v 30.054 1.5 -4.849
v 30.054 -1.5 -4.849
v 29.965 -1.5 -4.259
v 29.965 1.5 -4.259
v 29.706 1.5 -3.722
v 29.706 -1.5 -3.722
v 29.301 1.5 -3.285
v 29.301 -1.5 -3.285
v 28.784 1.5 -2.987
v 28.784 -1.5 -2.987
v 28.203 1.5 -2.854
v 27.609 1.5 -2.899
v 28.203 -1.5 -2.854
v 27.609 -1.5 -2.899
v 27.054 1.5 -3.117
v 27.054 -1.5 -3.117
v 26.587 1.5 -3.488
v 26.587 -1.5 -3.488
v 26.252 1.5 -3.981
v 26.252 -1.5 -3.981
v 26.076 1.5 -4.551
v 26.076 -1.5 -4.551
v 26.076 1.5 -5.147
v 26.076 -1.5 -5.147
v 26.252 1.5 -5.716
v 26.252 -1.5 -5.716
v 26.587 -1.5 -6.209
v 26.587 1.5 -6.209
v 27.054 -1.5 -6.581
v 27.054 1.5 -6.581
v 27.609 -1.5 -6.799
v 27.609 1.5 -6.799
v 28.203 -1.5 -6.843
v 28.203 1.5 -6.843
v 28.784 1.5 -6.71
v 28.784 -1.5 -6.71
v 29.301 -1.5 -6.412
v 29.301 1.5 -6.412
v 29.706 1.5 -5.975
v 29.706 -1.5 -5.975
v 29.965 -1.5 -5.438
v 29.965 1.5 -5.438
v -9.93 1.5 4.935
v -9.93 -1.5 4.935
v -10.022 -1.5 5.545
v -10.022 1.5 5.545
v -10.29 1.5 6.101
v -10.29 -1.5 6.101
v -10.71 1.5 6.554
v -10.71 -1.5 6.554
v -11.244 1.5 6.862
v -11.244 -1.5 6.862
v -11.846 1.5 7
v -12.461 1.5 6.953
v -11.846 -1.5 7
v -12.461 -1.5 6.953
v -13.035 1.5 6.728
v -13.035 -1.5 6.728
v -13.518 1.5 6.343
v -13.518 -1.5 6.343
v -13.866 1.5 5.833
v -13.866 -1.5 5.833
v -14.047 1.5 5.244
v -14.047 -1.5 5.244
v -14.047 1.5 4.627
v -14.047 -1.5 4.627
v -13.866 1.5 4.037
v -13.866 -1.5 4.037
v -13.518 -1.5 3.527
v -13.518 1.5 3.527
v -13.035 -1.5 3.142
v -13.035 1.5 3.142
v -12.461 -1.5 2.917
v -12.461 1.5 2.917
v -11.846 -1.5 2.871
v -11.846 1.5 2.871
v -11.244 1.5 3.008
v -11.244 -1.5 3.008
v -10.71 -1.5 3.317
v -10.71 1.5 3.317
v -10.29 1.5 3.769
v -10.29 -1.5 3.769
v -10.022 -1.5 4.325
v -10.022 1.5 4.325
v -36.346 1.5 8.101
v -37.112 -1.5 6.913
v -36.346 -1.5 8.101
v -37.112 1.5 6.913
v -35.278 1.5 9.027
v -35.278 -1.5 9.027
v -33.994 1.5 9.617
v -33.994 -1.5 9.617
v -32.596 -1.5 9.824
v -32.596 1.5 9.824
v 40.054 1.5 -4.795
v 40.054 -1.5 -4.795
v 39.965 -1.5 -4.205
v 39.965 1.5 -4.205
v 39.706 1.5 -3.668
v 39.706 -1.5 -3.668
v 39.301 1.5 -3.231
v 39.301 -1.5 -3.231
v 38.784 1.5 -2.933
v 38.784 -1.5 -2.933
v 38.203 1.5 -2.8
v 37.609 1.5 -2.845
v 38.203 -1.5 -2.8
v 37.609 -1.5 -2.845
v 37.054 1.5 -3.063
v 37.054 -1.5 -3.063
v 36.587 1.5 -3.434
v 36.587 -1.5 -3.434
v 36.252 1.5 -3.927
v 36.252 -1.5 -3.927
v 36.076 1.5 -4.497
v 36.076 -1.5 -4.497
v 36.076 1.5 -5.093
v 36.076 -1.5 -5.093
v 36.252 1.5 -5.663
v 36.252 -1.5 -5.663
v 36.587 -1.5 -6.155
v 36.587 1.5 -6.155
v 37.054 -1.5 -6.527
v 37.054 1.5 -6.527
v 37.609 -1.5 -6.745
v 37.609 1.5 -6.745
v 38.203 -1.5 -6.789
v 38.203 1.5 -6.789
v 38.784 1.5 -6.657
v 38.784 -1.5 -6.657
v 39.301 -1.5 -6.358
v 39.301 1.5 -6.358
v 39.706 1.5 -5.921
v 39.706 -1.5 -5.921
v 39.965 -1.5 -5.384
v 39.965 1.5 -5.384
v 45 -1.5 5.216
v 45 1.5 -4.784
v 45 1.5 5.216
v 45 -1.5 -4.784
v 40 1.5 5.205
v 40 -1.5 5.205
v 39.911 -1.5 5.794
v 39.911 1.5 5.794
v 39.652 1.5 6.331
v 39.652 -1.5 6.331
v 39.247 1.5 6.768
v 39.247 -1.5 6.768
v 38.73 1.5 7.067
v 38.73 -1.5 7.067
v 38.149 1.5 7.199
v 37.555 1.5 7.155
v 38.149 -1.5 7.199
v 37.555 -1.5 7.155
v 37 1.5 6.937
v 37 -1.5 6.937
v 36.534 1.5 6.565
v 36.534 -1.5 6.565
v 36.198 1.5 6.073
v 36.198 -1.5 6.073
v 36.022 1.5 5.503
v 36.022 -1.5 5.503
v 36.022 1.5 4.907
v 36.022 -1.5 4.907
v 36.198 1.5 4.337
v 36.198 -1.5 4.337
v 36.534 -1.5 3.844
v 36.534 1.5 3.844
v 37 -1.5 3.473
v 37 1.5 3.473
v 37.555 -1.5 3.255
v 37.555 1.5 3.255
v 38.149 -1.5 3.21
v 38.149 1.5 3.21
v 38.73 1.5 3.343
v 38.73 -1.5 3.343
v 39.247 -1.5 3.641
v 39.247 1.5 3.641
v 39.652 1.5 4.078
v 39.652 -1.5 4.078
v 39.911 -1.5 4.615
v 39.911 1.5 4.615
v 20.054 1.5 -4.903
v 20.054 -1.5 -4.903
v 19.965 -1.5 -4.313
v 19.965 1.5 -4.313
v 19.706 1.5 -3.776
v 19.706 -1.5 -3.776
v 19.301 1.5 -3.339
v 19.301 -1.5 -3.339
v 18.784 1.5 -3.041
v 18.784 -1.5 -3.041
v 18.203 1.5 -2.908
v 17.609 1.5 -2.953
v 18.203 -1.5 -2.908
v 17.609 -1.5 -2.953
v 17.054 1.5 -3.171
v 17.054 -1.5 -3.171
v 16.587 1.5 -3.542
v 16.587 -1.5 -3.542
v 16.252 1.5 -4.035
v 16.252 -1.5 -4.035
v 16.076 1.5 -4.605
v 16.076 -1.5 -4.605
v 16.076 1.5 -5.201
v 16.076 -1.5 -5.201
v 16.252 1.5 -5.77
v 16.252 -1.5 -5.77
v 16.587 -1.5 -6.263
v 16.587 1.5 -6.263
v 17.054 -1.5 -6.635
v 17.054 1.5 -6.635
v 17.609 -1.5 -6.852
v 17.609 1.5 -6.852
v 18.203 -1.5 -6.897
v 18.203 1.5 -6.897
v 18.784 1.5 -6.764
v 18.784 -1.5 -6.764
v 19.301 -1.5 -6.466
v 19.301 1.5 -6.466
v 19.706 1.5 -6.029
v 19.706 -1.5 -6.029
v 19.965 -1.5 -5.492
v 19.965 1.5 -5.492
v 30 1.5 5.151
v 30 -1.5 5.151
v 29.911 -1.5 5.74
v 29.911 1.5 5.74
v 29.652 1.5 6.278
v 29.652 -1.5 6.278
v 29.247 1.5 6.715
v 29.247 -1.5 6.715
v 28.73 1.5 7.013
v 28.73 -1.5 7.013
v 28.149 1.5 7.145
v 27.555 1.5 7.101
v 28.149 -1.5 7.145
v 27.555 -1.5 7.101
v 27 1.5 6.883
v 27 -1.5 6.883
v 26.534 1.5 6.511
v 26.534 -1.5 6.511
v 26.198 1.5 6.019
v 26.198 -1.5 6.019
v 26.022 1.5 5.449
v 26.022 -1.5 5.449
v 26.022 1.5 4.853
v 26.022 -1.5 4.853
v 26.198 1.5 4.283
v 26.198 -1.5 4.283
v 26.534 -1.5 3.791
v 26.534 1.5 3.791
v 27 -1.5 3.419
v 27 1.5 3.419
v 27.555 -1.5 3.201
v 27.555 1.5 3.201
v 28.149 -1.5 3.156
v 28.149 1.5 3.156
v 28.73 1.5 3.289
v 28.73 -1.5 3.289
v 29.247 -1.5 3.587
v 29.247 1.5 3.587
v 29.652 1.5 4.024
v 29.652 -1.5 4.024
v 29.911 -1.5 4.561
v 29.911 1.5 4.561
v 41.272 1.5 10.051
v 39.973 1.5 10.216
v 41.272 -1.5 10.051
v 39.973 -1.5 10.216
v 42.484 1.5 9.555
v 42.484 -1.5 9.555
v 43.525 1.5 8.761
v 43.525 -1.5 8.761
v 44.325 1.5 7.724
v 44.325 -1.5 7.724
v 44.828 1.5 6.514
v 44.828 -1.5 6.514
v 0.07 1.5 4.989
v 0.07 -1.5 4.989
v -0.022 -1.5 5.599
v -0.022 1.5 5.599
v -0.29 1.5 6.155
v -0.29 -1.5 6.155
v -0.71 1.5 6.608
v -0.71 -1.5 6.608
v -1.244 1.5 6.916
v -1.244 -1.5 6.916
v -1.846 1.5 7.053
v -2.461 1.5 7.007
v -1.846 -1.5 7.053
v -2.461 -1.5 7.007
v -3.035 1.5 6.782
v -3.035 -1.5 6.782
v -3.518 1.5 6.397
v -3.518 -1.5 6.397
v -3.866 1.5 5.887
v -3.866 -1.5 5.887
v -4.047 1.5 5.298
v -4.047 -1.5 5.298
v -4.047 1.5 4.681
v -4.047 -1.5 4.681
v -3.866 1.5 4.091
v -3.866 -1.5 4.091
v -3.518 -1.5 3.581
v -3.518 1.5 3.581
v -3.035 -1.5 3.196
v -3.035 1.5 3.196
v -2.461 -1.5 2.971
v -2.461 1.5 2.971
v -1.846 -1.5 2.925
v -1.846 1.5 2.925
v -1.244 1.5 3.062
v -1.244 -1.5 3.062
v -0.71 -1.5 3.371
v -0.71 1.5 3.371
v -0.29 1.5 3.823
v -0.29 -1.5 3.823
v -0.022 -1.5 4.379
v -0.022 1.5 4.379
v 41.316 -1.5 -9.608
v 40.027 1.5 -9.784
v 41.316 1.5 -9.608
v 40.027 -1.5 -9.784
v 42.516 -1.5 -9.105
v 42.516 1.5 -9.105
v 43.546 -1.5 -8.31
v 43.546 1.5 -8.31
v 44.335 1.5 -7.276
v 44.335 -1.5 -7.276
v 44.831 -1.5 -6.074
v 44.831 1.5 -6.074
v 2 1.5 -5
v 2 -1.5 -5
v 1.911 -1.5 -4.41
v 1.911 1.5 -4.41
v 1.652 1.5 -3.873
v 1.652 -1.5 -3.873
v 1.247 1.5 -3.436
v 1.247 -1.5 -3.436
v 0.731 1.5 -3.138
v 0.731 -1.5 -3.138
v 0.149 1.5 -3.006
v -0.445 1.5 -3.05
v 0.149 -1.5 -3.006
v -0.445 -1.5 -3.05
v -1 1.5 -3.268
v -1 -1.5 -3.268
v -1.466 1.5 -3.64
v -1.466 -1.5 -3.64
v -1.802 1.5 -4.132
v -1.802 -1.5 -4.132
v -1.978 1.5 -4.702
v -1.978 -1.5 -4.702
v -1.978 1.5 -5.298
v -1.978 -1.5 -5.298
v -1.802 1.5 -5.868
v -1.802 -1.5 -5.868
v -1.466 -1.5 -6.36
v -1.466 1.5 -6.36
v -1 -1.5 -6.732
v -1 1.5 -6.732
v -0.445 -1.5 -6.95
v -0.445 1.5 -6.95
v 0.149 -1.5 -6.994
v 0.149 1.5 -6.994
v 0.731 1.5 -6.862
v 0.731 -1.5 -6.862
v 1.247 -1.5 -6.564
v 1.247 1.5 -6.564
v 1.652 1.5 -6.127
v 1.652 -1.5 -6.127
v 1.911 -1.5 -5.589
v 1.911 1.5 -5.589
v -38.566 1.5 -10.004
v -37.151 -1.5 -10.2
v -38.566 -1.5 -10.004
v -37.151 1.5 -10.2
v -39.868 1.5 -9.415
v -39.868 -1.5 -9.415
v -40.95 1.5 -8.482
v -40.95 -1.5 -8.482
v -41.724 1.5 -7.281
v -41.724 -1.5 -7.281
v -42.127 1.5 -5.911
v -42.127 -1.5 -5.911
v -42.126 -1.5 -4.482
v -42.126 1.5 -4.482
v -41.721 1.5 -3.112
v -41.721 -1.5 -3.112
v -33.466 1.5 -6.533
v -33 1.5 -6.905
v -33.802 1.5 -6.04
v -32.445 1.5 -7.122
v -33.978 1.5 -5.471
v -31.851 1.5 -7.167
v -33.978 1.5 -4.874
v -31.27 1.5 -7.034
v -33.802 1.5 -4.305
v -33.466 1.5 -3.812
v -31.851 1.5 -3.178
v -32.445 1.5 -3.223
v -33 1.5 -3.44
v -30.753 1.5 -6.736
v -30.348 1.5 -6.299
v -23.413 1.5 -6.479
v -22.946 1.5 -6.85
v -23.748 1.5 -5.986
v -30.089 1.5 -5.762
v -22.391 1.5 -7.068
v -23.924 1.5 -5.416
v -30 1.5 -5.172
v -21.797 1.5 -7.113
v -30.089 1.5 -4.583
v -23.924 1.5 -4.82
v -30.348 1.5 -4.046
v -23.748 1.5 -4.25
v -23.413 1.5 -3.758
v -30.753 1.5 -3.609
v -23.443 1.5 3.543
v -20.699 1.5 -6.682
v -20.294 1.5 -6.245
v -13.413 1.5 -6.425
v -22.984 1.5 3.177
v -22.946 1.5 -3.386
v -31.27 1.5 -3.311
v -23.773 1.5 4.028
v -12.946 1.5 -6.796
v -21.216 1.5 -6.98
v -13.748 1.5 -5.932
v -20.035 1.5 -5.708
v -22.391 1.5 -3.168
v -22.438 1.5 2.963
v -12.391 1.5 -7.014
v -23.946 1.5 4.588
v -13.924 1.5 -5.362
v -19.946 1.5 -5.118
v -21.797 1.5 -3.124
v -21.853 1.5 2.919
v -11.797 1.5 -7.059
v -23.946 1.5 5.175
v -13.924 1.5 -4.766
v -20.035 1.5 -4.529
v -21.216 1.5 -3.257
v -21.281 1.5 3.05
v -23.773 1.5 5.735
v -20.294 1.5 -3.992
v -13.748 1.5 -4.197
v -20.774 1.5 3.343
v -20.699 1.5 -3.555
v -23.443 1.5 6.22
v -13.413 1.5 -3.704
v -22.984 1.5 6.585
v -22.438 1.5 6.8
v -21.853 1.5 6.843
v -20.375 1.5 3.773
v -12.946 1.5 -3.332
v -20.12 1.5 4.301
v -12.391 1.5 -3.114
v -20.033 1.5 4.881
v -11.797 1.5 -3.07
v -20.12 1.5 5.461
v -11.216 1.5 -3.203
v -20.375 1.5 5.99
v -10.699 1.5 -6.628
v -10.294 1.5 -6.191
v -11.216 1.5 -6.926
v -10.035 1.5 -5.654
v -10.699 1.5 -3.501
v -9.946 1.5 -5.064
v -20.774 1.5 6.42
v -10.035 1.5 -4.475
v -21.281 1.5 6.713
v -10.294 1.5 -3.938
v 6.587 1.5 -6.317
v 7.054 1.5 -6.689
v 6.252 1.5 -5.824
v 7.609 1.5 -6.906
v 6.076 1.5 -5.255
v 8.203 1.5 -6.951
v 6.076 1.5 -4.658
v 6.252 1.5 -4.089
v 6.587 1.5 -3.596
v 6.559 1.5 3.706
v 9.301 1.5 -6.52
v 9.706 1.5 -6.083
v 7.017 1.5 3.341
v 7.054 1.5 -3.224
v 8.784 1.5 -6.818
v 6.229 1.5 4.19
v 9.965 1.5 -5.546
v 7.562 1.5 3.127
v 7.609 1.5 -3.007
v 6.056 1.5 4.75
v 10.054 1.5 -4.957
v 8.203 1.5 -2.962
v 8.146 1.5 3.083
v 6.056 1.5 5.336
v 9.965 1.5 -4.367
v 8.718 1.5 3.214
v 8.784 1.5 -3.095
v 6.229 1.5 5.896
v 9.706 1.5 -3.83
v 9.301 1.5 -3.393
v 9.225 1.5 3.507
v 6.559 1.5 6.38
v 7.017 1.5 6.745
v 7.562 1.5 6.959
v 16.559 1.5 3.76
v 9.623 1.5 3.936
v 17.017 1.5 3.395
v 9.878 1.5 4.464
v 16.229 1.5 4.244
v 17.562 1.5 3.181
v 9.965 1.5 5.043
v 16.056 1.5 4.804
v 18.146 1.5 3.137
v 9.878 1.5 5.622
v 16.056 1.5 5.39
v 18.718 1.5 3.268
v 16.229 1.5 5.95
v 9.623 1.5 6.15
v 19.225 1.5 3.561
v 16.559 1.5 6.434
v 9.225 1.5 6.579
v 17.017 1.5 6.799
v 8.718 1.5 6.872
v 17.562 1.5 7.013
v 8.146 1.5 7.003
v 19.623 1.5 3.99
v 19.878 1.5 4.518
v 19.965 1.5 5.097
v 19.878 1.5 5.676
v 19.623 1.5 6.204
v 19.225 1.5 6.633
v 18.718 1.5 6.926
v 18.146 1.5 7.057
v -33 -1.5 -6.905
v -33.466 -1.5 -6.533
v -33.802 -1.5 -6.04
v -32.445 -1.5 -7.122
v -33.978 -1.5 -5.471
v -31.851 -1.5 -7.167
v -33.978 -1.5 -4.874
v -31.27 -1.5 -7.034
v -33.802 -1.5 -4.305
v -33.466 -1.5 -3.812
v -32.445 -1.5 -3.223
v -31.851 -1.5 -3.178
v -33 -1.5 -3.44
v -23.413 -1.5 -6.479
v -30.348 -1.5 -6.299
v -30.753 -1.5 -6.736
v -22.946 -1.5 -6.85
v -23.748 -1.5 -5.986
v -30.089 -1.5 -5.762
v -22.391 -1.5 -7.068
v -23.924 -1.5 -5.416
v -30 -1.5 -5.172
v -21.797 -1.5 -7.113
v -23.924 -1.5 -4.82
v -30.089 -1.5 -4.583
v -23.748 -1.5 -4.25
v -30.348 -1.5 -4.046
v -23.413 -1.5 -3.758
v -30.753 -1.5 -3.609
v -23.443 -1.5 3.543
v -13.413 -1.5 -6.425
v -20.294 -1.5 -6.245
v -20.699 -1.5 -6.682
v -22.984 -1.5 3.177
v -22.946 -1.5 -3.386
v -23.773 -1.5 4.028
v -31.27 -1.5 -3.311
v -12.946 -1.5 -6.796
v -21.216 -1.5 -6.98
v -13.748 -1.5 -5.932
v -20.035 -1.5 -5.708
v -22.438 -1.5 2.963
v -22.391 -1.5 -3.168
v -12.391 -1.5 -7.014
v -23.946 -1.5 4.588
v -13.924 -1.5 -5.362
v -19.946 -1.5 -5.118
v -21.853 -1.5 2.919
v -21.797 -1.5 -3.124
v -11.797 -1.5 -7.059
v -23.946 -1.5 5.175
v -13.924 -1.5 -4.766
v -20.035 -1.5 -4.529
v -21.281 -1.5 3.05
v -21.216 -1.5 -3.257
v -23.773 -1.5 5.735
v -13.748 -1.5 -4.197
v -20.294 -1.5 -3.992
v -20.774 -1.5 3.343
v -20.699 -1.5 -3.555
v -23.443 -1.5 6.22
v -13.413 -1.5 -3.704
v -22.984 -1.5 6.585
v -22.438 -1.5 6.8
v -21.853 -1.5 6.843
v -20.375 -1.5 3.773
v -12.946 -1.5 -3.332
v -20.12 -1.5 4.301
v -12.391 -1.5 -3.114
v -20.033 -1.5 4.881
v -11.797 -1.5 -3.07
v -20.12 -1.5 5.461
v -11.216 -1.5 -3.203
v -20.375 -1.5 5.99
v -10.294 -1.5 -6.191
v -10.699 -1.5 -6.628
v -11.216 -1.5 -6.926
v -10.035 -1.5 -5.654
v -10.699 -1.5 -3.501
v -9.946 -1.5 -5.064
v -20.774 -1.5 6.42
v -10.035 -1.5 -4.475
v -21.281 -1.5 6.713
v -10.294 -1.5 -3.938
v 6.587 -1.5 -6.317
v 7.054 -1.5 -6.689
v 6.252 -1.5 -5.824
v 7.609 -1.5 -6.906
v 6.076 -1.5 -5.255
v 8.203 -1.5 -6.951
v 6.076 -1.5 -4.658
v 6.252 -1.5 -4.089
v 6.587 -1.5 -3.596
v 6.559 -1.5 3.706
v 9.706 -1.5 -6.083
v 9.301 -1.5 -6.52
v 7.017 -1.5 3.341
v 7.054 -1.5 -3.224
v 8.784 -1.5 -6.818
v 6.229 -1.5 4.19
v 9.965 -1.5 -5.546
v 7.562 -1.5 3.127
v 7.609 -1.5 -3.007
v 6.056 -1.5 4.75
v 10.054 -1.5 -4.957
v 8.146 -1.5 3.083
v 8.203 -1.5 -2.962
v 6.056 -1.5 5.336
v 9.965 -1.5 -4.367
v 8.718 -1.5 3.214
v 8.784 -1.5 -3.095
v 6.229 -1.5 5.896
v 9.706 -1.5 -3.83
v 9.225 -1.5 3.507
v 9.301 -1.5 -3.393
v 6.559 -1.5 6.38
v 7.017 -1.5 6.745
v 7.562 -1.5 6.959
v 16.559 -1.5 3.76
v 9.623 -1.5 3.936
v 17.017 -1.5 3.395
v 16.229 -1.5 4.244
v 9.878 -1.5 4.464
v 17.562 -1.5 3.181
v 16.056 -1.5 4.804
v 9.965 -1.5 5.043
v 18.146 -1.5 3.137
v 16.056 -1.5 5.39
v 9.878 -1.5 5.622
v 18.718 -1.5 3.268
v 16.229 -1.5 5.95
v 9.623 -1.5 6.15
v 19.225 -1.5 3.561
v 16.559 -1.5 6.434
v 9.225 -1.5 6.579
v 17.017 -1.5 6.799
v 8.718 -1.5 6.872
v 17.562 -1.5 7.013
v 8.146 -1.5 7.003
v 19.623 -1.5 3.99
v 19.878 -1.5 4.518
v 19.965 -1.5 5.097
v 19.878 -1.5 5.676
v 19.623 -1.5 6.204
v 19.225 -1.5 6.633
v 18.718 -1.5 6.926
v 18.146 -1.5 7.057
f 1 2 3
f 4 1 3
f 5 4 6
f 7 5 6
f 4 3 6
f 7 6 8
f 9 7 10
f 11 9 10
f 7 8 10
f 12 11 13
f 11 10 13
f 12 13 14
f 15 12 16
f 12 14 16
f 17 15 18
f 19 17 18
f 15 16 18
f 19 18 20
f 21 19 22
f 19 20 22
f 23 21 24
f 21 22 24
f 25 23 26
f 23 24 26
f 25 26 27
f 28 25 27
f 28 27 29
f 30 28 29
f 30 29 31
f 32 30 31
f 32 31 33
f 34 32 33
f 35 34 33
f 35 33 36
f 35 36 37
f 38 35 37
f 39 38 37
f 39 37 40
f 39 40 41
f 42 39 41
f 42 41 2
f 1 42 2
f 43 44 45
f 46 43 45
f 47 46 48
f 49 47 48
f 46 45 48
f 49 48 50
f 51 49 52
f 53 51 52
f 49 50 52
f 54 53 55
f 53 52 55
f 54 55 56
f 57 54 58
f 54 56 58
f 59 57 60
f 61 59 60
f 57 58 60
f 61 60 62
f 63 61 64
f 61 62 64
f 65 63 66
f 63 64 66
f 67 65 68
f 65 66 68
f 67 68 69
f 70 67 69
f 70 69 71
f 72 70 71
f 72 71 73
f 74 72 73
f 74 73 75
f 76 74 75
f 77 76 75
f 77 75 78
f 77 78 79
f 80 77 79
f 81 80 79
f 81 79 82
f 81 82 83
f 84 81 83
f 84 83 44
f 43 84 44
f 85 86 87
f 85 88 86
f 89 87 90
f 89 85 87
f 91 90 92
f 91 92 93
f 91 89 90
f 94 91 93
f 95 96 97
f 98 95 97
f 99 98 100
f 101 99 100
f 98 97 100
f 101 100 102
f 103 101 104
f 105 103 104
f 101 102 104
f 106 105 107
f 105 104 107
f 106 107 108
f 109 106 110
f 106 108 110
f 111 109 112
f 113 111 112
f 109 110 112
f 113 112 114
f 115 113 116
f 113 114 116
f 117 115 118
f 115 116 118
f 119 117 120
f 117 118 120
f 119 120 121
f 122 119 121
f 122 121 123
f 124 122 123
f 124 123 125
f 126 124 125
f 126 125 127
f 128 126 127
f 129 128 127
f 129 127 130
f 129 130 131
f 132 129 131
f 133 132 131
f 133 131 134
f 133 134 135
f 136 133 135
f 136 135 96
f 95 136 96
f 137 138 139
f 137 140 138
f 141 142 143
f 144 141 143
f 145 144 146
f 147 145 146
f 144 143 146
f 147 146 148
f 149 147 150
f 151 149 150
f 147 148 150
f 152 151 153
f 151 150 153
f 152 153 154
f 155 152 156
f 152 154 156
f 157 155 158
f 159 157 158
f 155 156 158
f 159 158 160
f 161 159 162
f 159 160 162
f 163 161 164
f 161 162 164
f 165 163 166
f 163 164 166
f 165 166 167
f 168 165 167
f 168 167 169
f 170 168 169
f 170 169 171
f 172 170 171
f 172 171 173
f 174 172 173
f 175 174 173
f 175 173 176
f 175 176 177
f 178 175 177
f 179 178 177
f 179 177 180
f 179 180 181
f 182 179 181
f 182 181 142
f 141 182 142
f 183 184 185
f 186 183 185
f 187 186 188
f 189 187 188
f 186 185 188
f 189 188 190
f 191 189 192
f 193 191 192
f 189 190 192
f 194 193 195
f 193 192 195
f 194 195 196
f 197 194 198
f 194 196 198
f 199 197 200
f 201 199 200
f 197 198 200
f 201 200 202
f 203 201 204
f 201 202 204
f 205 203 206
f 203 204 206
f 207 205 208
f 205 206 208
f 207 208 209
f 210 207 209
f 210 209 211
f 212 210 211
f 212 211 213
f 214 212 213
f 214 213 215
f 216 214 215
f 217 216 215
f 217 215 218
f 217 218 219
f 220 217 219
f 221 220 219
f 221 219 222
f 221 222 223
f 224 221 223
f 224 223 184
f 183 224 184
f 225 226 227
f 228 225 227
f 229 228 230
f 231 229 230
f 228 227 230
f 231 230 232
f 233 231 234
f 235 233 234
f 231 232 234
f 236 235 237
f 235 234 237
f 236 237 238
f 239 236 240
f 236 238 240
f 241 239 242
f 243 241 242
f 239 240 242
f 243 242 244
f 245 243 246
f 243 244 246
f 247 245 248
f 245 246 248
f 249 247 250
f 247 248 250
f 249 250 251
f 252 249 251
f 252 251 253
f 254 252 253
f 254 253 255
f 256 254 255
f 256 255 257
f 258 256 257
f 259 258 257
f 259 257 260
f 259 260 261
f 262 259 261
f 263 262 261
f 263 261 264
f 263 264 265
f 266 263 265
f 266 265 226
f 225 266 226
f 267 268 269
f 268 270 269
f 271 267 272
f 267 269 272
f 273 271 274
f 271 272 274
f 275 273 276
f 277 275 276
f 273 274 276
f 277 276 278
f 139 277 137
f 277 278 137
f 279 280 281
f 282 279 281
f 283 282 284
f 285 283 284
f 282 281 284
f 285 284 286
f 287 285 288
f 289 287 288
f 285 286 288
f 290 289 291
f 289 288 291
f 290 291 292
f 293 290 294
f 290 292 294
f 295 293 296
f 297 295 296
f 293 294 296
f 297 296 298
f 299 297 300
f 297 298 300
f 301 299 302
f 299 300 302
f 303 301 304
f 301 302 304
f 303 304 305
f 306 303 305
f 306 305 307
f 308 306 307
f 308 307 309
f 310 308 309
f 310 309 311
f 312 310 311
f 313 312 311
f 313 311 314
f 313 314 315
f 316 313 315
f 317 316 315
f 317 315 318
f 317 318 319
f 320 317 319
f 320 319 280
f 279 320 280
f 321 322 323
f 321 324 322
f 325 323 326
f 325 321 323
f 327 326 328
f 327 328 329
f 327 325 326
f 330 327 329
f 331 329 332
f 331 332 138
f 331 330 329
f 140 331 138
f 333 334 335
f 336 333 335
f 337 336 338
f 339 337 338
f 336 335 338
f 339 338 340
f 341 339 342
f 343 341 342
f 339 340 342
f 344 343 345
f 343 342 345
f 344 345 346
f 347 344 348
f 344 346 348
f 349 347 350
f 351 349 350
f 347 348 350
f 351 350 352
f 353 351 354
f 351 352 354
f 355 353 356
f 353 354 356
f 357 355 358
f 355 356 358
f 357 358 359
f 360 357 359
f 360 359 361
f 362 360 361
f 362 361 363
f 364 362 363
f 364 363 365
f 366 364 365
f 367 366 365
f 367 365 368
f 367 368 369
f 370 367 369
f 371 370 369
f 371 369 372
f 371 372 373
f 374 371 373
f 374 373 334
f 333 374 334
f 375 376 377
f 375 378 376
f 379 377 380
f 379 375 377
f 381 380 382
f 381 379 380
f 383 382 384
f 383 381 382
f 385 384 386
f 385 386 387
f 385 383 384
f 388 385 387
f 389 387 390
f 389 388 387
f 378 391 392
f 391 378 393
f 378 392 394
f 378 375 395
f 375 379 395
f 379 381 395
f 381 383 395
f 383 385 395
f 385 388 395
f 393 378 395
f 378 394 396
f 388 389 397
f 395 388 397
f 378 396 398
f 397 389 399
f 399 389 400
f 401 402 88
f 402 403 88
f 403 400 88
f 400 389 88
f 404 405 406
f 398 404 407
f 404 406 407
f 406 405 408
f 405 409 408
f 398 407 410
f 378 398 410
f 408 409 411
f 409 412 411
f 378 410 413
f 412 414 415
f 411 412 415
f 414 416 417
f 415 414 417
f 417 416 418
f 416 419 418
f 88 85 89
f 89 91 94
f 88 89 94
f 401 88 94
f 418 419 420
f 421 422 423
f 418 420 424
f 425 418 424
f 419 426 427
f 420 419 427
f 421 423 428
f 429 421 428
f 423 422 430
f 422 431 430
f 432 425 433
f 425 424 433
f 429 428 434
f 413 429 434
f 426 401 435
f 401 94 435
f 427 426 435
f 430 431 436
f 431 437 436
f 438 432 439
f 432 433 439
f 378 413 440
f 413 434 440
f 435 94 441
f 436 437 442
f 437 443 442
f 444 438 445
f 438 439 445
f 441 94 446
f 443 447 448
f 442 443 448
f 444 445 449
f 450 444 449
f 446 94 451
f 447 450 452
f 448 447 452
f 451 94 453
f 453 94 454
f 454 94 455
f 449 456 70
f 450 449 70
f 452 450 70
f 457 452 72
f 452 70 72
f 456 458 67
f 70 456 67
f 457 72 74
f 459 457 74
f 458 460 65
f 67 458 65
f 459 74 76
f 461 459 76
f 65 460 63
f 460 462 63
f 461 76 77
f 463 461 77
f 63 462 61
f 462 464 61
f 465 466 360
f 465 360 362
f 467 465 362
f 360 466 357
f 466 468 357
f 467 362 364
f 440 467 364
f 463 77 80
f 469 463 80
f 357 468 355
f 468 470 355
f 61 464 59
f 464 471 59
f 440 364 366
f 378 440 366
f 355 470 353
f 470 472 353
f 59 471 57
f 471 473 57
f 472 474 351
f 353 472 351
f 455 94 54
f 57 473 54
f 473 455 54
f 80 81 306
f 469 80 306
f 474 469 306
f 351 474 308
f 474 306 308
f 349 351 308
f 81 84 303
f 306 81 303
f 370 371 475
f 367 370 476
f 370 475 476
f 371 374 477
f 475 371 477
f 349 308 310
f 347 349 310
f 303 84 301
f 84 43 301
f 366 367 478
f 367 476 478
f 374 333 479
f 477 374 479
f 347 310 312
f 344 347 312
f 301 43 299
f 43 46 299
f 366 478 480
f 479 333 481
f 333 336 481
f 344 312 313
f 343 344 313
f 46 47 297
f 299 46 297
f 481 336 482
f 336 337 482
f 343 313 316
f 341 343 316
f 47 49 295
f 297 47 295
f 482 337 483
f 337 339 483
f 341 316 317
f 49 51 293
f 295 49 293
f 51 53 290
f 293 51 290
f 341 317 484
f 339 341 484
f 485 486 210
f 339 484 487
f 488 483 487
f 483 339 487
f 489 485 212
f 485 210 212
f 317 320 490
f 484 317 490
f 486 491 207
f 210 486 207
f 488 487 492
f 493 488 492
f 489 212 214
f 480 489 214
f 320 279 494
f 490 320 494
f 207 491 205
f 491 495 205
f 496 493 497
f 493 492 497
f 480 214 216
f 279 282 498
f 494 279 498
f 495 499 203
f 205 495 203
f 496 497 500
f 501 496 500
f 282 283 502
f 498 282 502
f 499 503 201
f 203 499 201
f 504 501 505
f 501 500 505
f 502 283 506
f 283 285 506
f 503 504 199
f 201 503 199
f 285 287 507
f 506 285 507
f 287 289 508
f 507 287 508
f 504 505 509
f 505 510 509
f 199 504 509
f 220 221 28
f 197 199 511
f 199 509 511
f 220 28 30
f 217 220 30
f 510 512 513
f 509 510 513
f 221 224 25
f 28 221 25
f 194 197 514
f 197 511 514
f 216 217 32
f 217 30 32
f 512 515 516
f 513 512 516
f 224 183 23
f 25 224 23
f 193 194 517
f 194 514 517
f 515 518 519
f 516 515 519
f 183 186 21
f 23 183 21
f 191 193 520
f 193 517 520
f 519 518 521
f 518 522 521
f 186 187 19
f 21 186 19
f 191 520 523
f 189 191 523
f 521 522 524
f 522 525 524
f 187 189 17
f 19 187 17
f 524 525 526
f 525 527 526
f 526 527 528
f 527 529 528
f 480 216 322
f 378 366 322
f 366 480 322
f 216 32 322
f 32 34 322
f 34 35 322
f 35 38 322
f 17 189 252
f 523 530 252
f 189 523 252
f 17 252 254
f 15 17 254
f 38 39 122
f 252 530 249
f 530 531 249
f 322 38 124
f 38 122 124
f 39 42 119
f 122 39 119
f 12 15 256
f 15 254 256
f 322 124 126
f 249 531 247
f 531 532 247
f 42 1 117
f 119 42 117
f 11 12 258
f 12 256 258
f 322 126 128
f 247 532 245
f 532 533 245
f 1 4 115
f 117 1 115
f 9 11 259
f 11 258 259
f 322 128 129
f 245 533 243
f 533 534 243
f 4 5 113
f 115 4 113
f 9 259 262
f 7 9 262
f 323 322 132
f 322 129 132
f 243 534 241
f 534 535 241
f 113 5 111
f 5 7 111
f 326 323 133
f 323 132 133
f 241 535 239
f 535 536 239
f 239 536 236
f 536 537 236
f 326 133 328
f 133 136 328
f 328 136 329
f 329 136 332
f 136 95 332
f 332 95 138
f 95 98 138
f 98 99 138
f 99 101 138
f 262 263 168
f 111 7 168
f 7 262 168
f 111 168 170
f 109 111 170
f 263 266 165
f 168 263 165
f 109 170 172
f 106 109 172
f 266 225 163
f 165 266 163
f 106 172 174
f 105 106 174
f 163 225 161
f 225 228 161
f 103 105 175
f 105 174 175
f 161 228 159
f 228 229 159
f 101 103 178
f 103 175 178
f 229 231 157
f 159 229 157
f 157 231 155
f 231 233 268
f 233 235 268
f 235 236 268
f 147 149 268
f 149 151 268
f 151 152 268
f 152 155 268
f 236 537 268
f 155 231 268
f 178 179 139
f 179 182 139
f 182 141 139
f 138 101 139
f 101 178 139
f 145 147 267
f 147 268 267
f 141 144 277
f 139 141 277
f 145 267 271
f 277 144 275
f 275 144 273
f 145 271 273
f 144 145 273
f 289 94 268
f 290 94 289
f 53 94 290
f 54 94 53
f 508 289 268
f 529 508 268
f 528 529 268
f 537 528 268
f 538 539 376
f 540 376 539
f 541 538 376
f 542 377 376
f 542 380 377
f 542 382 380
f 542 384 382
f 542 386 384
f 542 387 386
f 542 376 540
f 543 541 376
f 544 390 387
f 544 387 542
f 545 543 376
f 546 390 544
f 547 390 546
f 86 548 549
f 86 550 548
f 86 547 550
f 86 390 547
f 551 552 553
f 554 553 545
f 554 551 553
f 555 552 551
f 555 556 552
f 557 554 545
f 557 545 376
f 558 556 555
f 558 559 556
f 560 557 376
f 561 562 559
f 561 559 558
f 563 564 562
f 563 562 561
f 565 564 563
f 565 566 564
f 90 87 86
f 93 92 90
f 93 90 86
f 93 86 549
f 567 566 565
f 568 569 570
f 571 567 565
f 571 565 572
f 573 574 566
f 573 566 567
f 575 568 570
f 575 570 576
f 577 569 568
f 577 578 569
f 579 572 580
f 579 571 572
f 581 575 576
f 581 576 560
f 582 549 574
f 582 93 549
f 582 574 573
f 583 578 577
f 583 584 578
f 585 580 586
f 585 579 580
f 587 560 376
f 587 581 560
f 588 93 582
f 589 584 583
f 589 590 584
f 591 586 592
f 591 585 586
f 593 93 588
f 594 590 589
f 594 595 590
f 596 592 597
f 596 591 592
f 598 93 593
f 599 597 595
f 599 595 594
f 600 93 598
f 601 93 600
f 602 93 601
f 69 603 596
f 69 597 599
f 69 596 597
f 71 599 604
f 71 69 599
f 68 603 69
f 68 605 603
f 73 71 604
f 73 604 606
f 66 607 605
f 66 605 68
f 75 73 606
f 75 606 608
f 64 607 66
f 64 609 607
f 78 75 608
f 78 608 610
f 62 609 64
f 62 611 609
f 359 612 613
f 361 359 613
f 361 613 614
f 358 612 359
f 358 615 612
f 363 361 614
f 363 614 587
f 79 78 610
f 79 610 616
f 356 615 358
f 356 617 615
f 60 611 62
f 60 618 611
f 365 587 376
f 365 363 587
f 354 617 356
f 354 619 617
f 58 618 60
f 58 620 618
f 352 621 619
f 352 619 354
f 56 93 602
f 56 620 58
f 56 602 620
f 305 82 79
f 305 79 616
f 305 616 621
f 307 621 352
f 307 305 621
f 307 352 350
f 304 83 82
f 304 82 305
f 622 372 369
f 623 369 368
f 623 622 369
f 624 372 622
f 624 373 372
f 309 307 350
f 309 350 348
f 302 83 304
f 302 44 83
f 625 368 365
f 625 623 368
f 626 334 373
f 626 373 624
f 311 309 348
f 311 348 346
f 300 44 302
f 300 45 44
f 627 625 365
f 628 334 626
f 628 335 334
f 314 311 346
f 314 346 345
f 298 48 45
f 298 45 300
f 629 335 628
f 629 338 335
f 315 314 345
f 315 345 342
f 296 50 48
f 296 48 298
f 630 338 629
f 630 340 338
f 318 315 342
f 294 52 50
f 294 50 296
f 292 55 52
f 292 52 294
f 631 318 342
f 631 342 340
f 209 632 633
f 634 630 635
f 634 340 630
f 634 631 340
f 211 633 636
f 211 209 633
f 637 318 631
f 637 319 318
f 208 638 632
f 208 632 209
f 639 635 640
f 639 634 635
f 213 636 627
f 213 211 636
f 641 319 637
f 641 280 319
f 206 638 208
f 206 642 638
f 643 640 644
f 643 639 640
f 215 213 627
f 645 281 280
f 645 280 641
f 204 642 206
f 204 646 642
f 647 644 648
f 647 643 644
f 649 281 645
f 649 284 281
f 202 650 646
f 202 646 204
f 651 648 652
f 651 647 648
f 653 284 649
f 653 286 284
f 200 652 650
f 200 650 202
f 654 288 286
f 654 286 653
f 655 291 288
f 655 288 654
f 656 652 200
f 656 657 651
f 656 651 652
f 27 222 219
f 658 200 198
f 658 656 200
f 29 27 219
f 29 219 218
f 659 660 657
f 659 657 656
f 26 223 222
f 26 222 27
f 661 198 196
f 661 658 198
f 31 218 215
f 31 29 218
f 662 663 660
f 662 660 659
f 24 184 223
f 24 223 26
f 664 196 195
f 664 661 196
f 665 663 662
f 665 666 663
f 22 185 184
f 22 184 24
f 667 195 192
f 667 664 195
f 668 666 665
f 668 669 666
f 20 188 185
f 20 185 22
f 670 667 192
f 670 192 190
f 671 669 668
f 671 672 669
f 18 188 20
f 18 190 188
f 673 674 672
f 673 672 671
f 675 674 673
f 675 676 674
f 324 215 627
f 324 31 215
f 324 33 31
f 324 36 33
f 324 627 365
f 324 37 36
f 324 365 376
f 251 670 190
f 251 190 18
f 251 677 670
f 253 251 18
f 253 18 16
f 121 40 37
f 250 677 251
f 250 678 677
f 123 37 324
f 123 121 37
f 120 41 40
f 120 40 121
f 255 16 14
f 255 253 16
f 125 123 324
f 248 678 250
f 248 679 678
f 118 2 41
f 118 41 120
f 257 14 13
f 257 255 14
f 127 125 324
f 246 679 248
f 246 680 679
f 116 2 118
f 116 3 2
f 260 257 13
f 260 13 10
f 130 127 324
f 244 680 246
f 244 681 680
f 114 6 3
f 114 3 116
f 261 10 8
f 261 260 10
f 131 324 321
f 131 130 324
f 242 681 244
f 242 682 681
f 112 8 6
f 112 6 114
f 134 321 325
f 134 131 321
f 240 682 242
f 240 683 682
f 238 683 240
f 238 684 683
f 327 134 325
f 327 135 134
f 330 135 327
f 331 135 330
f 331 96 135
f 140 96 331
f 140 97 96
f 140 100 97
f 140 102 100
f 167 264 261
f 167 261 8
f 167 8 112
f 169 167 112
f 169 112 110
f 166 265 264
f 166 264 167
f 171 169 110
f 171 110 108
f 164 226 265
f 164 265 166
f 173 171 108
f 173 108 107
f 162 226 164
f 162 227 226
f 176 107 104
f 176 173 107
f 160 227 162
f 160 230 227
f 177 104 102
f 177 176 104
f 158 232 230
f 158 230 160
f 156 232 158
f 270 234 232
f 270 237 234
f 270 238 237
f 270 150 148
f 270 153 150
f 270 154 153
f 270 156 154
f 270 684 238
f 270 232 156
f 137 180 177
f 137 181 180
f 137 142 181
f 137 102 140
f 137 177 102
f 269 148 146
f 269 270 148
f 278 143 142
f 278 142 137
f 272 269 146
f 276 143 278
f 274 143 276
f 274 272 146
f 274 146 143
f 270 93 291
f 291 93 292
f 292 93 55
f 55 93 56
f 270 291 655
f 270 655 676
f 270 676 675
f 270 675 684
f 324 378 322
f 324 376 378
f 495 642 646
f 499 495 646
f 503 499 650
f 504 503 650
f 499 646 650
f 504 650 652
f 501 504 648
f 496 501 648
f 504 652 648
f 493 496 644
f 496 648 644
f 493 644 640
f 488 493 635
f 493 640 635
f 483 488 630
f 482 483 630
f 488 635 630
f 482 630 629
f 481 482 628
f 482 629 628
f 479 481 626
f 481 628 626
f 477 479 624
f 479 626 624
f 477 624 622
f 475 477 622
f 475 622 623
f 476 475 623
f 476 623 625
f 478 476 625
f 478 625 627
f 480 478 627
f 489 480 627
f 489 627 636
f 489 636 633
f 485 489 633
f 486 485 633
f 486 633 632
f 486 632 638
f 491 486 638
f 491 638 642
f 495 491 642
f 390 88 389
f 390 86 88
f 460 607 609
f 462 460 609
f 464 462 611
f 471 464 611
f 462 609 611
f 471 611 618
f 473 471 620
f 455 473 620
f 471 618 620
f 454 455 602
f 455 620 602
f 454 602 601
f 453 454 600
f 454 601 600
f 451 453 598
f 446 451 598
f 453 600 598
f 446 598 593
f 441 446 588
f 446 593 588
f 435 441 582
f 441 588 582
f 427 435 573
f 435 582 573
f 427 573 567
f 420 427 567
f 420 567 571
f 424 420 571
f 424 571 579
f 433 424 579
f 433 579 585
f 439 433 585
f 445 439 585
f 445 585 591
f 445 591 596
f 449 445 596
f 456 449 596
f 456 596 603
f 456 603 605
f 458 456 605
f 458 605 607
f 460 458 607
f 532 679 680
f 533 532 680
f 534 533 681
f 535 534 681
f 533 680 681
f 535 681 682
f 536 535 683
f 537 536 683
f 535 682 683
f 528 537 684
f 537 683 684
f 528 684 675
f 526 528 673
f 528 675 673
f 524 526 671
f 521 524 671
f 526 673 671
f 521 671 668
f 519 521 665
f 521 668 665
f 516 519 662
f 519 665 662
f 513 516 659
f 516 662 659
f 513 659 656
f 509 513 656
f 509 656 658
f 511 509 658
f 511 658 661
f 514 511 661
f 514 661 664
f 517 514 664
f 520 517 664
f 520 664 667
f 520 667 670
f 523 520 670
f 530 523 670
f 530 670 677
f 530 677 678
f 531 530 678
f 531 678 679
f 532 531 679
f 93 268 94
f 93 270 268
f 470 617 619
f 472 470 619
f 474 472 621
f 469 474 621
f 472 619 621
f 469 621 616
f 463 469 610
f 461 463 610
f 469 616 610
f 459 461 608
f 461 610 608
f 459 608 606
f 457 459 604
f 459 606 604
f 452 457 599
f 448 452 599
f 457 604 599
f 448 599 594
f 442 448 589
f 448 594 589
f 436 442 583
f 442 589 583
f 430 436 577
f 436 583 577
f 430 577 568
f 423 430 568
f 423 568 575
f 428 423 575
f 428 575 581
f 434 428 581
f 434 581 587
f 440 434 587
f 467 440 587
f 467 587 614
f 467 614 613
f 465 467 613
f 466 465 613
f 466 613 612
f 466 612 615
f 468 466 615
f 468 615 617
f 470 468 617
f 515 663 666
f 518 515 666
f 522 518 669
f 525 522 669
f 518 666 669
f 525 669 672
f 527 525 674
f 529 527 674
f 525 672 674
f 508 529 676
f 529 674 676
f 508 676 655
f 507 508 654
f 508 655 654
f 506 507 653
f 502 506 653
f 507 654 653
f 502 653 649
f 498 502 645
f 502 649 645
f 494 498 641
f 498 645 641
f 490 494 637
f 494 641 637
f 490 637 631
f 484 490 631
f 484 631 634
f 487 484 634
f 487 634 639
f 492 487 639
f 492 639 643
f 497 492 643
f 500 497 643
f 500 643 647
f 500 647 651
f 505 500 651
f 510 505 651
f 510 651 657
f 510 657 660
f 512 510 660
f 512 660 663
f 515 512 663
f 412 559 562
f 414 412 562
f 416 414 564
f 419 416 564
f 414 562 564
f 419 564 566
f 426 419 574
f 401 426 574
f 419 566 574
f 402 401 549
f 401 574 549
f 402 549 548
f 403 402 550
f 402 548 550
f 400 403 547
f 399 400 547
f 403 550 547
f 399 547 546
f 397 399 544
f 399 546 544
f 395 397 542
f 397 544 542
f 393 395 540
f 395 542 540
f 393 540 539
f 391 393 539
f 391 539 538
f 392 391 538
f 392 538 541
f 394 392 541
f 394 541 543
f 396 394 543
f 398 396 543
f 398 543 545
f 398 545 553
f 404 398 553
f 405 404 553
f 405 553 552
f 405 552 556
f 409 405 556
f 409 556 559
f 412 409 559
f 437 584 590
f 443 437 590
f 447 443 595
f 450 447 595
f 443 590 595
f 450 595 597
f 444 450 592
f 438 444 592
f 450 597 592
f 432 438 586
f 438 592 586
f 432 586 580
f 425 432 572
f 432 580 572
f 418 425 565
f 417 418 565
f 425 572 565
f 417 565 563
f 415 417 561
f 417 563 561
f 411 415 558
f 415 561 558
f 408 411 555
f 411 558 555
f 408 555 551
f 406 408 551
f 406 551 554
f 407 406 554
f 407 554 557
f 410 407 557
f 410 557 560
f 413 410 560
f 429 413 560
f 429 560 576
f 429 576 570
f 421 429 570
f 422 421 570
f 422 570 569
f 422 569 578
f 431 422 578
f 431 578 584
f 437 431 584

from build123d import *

# Parameters (mm, degrees)
F1_DEPTH = 1.5
F2_R     = 5
F3_R     = 2
F3_R_2   = 1.965178389
F3_R_3   = 2.0701414228
F3_R_4   = 1.9676743652
F4_DEPTH = 25


# Not quite as in the source:
# - a feature names something its author has since deleted; it is built from what else it names


with BuildPart() as f1:
    # F0 (on Front) → F1 (new body, symmetric)
    with BuildSketch(Plane.XZ):
        Polygon((-44.9992595649, -10.2426138069), (45.0007404351, -9.7573861383), (44.9992595649, 10.2426138069), (-35.7811990629, 9.8070925446), align=None)
    extrude(amount=F1_DEPTH, both=True)

    # F2
    f2_edges = [f1.edges().sort_by_distance(p)[0] for p in [
        (45.00074, 0, -9.757386),
        (-35.781199, 0, 9.807093),
        (-44.99926, 0, -10.242614),
        (44.99926, 0, 10.242614),
    ]]
    fillet(f2_edges, radius=F2_R)

    # F3 (on face) → F4 (cut)
    with BuildSketch(Plane.XZ.offset(1.5)):
        with Locations((37.9996325629, 5.2048032201)):
            Circle(F3_R)
        with Locations((27.9996325629, 5.1508890347)):
            Circle(F3_R)
        with Locations((17.9996325629, 5.0969748493)):
            Circle(F3_R_2)
        with Locations((7.9996325629, 5.0430606639)):
            Circle(F3_R_2)
        with Locations((-2.0003674371, 4.9891464785)):
            Circle(F3_R_3)
        with Locations((-12.0003674371, 4.9352322931)):
            Circle(F3_R_3)
        with Locations((-22.0003674371, 4.8813181077)):
            Circle(F3_R_4)
        with Locations((38.0535444404, -4.7947687116)):
            Circle(F3_R)
        with Locations((28.0535444404, -4.848682897)):
            Circle(F3_R)
        with Locations((18.0535444404, -4.9025970824)):
            Circle(F3_R)
        with Locations((8.0535444404, -4.9565112678)):
            Circle(F3_R)
        with Locations((0, -4.9999312966)):
            Circle(F3_R)
        with Locations((-11.9464555596, -5.0643396386)):
            Circle(F3_R)
        with Locations((-21.9464555596, -5.118253824)):
            Circle(F3_R)
        with Locations((-32.0003674371, -5.1724586709)):
            Circle(F3_R)
    extrude(amount=-F4_DEPTH, mode=Mode.SUBTRACT)


solid = f1.part
